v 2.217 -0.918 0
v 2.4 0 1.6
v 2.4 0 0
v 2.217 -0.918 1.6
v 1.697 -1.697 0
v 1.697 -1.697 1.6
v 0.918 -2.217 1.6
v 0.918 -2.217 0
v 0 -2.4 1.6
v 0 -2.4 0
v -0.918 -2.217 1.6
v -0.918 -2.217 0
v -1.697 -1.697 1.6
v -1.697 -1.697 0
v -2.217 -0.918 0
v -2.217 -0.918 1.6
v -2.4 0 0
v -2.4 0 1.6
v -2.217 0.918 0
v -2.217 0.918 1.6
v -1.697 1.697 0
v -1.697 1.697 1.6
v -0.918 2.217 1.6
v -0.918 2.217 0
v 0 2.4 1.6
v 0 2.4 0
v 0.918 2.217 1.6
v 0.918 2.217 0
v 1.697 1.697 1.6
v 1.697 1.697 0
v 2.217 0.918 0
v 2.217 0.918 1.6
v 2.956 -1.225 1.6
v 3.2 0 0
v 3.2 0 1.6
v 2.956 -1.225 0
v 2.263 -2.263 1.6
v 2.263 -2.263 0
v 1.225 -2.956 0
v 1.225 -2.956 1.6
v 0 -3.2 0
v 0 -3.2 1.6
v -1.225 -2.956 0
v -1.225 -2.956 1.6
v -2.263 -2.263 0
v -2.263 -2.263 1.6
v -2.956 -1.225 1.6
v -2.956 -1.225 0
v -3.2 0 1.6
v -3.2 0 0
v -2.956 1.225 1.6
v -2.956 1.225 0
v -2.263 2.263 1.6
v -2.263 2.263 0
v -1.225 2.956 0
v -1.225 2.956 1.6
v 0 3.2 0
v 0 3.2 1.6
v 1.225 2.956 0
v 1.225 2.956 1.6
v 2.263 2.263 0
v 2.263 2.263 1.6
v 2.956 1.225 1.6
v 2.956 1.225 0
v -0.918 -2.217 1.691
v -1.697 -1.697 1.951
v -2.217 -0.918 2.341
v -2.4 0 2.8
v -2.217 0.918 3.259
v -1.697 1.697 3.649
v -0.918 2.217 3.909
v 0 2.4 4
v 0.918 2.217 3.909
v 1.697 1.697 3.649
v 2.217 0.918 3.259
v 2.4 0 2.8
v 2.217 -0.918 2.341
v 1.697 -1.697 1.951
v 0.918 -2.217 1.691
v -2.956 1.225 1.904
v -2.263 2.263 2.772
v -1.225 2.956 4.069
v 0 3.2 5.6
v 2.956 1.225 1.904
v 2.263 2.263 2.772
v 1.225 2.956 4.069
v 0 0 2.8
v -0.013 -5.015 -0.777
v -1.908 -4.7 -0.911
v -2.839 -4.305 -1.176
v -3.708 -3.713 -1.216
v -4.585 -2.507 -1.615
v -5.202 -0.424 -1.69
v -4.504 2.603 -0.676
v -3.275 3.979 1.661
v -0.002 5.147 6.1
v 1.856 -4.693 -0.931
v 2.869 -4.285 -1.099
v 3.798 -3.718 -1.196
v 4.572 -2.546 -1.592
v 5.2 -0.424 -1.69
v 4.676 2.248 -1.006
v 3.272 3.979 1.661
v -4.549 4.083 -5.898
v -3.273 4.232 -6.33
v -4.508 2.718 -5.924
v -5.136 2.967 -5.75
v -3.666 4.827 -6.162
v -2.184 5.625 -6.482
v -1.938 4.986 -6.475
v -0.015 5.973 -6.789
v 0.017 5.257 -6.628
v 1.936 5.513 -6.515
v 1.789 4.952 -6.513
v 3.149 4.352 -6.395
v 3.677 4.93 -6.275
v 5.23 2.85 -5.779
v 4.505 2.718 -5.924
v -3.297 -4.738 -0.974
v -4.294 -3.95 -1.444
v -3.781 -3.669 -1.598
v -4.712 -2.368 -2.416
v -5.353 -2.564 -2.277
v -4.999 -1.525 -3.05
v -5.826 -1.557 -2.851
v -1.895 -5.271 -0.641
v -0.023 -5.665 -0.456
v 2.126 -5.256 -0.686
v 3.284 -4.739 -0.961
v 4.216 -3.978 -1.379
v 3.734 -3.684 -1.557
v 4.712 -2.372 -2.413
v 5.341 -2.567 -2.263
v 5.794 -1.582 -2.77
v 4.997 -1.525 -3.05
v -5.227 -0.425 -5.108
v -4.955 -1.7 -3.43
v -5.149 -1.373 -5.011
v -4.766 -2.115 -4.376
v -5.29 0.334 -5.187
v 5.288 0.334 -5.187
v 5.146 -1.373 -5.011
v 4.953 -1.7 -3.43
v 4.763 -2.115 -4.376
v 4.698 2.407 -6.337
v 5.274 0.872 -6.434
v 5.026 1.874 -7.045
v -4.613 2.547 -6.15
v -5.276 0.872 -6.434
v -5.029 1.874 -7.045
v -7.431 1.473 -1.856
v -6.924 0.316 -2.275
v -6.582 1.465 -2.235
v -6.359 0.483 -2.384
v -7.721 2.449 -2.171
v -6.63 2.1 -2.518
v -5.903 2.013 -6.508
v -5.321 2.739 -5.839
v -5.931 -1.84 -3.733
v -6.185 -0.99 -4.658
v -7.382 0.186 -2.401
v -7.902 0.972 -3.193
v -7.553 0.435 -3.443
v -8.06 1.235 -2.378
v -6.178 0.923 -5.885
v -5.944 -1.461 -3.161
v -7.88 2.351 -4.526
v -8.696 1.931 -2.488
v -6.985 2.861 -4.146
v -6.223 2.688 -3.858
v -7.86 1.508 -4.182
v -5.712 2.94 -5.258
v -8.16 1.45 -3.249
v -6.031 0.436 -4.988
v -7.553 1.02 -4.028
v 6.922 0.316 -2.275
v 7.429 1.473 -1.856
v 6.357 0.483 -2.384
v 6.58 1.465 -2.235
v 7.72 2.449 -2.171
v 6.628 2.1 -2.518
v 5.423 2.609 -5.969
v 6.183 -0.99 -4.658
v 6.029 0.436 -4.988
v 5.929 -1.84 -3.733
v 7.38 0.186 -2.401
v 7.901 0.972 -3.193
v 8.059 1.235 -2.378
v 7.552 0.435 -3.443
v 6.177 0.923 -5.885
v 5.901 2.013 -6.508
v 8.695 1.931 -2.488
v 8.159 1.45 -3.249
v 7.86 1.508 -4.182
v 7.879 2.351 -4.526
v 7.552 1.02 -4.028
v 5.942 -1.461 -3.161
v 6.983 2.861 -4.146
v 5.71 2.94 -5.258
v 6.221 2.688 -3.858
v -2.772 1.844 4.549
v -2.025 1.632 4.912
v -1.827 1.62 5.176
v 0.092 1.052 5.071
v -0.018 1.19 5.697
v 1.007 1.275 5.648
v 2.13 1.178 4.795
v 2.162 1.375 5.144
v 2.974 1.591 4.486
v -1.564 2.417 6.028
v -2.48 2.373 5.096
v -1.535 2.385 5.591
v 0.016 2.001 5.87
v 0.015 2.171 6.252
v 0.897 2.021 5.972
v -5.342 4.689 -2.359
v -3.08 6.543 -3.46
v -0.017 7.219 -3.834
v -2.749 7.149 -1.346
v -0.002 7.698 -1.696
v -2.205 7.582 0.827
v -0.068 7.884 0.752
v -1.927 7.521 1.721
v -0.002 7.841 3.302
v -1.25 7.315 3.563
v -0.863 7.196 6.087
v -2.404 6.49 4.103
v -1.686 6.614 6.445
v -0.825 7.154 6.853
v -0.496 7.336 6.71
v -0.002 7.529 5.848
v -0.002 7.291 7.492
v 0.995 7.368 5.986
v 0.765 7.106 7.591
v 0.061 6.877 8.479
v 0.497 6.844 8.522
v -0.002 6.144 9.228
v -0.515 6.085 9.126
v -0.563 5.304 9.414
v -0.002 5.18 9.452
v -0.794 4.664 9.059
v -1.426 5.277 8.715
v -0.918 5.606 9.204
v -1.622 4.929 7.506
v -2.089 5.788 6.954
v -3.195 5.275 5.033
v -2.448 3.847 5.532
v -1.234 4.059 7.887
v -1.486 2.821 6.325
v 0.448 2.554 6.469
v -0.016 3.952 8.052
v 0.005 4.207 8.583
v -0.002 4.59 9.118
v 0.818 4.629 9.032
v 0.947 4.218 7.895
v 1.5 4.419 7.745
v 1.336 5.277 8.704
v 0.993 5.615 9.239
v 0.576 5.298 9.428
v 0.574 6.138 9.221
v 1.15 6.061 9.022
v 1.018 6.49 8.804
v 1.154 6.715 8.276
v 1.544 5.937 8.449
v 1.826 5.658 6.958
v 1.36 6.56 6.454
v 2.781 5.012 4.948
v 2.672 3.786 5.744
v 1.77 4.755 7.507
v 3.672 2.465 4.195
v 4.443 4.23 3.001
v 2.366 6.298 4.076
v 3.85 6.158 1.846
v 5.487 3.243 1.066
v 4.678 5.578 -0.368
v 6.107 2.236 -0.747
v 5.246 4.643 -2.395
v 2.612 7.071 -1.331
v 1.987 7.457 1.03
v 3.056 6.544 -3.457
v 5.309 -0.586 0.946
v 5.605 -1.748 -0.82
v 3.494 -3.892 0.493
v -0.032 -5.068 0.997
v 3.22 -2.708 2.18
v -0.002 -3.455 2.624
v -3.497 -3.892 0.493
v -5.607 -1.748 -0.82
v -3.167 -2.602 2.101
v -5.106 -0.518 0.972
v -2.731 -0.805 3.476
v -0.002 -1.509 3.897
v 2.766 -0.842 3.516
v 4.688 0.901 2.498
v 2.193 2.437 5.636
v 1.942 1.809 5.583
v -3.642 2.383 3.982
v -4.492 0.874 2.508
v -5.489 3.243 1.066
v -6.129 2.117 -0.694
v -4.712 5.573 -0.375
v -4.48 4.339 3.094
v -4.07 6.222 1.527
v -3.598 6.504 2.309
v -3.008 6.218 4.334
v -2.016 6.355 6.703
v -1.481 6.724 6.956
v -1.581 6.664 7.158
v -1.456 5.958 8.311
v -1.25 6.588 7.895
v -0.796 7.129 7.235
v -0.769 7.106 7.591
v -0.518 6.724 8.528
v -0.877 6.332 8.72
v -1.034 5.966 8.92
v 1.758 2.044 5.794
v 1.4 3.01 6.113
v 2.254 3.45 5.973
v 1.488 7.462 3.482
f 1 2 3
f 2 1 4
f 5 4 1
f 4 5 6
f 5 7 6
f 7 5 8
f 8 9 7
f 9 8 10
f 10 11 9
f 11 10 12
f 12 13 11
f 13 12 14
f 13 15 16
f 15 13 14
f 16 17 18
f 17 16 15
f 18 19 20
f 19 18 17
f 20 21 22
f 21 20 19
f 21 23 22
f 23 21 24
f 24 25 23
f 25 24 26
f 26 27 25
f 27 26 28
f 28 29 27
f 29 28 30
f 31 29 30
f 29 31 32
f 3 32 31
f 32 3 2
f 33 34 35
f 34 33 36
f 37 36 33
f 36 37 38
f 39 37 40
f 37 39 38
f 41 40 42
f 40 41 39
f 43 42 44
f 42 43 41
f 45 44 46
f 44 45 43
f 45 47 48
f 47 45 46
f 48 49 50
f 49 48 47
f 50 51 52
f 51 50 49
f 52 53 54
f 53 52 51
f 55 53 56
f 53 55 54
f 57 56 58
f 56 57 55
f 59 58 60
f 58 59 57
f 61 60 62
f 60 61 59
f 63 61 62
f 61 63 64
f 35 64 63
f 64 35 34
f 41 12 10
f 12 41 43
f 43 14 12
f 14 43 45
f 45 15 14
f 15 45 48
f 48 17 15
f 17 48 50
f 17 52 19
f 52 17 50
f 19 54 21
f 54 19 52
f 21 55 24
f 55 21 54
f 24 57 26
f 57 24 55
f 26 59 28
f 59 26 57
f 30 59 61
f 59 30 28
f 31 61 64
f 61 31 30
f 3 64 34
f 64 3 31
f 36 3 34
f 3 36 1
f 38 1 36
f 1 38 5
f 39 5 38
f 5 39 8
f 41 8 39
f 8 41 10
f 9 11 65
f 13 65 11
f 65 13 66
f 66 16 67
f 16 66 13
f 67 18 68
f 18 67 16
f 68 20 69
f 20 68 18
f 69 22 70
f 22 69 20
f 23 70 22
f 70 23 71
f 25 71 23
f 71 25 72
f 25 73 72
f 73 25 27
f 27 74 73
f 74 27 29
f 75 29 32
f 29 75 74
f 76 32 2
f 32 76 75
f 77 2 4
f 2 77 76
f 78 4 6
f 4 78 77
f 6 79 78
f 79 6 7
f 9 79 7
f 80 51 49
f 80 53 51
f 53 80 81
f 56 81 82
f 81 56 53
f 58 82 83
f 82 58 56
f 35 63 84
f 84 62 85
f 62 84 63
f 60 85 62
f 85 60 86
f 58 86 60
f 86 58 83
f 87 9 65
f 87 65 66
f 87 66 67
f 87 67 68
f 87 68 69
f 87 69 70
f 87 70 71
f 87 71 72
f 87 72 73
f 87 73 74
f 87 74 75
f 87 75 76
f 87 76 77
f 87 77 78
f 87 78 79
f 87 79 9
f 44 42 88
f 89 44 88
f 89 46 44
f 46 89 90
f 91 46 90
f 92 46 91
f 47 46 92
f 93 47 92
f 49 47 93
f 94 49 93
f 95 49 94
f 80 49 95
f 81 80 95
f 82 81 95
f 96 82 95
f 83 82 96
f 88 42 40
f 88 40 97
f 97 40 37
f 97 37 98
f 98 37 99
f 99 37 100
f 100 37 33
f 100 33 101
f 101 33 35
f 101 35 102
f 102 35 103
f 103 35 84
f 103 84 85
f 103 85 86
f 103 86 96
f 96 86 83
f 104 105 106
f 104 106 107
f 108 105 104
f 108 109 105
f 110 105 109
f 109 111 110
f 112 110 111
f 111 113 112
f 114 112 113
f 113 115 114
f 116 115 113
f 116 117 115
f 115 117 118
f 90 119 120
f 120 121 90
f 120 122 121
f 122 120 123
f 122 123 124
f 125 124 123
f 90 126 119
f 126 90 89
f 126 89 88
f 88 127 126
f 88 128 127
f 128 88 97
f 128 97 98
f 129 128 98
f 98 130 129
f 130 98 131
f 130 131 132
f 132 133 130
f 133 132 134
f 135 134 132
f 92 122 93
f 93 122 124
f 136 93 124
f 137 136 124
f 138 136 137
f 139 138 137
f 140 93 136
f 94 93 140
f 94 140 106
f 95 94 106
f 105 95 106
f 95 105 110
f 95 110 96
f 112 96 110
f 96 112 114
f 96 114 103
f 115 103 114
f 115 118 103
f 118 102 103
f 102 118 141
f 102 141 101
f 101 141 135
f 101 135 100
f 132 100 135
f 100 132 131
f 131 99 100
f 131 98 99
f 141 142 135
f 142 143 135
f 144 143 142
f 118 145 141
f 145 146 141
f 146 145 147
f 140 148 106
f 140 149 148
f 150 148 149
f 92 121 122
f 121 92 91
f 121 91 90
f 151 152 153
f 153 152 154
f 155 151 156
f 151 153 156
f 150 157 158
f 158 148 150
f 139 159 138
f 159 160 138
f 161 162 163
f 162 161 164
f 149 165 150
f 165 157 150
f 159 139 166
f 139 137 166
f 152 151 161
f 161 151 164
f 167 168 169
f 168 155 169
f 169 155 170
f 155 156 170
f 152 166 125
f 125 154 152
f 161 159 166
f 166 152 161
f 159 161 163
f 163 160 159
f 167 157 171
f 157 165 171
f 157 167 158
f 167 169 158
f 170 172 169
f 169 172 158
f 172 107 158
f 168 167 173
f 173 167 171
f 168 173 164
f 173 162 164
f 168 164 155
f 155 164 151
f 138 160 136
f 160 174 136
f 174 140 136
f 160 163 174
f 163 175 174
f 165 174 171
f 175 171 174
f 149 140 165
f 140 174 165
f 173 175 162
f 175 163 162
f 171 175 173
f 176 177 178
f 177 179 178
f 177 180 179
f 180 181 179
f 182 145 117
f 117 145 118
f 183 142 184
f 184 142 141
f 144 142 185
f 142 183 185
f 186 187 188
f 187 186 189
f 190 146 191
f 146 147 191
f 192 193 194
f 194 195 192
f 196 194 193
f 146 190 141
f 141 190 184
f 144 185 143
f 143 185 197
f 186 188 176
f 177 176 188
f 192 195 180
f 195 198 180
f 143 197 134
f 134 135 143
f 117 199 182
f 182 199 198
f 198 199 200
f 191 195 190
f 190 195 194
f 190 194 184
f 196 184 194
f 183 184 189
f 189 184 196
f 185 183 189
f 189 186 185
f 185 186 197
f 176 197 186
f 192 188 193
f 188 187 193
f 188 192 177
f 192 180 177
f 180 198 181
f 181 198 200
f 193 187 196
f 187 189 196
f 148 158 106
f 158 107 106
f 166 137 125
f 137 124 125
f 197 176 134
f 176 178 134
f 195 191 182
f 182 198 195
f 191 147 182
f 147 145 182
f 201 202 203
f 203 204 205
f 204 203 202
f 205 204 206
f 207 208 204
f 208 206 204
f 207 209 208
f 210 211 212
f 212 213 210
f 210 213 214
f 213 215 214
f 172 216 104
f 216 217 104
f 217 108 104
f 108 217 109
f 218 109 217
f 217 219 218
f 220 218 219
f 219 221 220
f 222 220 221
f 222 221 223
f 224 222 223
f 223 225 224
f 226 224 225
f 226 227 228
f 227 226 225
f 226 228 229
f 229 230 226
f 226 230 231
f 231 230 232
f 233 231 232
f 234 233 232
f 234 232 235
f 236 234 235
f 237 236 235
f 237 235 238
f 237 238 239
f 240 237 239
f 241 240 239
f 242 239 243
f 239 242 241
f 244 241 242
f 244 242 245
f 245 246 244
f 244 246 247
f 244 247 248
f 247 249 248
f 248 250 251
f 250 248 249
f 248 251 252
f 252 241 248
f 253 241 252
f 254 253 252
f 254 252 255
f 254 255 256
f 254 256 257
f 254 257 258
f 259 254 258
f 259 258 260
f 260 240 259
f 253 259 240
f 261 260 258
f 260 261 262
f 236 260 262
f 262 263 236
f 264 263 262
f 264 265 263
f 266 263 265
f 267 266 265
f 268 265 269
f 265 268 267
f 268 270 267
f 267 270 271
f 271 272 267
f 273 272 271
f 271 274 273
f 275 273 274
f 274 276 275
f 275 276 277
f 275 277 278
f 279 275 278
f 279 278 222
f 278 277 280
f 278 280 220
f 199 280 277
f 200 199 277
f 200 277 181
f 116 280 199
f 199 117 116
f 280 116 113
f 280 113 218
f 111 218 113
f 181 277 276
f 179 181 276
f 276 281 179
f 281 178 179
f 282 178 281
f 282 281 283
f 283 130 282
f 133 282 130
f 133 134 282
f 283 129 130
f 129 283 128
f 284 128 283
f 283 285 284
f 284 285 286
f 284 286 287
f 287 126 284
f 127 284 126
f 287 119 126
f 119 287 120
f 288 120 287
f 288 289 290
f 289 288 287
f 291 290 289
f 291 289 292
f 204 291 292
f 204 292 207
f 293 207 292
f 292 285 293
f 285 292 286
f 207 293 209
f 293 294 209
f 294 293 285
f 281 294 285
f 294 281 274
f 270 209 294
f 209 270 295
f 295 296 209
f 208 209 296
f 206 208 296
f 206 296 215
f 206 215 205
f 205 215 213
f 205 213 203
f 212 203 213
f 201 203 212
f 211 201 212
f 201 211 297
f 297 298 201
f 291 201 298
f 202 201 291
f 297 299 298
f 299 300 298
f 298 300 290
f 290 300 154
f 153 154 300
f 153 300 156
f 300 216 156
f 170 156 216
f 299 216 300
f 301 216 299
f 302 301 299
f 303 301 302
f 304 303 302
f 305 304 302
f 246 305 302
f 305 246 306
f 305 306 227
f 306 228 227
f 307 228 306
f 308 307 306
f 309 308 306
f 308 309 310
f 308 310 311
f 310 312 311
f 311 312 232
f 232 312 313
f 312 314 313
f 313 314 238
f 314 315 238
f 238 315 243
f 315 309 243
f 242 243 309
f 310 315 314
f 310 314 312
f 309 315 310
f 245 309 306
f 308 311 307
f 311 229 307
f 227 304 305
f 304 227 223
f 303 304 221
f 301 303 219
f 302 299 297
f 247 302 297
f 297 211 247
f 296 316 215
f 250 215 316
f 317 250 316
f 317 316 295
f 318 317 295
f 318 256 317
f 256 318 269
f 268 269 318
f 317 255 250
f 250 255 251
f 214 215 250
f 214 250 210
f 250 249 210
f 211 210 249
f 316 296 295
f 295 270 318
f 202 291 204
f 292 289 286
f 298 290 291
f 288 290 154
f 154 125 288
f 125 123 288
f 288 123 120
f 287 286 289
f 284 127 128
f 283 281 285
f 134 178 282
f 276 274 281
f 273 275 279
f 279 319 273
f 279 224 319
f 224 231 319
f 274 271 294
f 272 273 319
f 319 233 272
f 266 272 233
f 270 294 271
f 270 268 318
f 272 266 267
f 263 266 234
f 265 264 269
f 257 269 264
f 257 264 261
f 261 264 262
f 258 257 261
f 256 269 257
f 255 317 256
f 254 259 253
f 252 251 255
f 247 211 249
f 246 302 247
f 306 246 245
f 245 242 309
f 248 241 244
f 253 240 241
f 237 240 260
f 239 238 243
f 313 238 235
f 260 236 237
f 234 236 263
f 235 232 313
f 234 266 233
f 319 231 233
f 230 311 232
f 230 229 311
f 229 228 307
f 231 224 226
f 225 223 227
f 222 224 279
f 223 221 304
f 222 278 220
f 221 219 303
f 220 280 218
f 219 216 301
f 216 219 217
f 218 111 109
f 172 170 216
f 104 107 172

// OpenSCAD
use <../lib.scad>
use <s/13787s01.scad>
use <s/13787s02.scad>
function ldraw_lib__13787p02() = [
// 0 Minifig Hat Elf with Pointy Ears with Red Top Pattern
// 0 Name: 13787p02.dat
// 0 Author: Evert-Jan Boer [ejboer]
// 0 !LDRAW_ORG Part UPDATE 2022-06
// 0 !LICENSE Licensed under CC BY 2.0 and CC BY 4.0 : see CAreadme.txt
// 
// 0 BFC CERTIFY CCW
  [0,"BFC","CERTIFY"],
  [0,"BFC","CCW"],
// 
// 0 !CATEGORY Minifig Headwear
// 0 !KEYWORDS Bricklink 13787pb02, Christmas, Holiday, Set 40484
// 
// 0 !HISTORY 2022-10-14 [ejboer] Based on 13787p01 by Philo
// 0 !HISTORY 2022-12-20 [PTadmin] Official Update 2022-06
// 
// 
// 1 16 0 0 0 1 0 0 0 1 0 0 0 1 s\13787s01.dat
  [1,16,0,0,0,1,0,0,0,1,0,0,0,1, ldraw_lib__s__13787s01()],
// 1 4 0 0 0 1 0 0 0 1 0 0 0 1 s\13787s02.dat
  [1,4,0,0,0,1,0,0,0,1,0,0,0,1, ldraw_lib__s__13787s02()],
];
makepoly(ldraw_lib__13787p02(), line=0.2);
